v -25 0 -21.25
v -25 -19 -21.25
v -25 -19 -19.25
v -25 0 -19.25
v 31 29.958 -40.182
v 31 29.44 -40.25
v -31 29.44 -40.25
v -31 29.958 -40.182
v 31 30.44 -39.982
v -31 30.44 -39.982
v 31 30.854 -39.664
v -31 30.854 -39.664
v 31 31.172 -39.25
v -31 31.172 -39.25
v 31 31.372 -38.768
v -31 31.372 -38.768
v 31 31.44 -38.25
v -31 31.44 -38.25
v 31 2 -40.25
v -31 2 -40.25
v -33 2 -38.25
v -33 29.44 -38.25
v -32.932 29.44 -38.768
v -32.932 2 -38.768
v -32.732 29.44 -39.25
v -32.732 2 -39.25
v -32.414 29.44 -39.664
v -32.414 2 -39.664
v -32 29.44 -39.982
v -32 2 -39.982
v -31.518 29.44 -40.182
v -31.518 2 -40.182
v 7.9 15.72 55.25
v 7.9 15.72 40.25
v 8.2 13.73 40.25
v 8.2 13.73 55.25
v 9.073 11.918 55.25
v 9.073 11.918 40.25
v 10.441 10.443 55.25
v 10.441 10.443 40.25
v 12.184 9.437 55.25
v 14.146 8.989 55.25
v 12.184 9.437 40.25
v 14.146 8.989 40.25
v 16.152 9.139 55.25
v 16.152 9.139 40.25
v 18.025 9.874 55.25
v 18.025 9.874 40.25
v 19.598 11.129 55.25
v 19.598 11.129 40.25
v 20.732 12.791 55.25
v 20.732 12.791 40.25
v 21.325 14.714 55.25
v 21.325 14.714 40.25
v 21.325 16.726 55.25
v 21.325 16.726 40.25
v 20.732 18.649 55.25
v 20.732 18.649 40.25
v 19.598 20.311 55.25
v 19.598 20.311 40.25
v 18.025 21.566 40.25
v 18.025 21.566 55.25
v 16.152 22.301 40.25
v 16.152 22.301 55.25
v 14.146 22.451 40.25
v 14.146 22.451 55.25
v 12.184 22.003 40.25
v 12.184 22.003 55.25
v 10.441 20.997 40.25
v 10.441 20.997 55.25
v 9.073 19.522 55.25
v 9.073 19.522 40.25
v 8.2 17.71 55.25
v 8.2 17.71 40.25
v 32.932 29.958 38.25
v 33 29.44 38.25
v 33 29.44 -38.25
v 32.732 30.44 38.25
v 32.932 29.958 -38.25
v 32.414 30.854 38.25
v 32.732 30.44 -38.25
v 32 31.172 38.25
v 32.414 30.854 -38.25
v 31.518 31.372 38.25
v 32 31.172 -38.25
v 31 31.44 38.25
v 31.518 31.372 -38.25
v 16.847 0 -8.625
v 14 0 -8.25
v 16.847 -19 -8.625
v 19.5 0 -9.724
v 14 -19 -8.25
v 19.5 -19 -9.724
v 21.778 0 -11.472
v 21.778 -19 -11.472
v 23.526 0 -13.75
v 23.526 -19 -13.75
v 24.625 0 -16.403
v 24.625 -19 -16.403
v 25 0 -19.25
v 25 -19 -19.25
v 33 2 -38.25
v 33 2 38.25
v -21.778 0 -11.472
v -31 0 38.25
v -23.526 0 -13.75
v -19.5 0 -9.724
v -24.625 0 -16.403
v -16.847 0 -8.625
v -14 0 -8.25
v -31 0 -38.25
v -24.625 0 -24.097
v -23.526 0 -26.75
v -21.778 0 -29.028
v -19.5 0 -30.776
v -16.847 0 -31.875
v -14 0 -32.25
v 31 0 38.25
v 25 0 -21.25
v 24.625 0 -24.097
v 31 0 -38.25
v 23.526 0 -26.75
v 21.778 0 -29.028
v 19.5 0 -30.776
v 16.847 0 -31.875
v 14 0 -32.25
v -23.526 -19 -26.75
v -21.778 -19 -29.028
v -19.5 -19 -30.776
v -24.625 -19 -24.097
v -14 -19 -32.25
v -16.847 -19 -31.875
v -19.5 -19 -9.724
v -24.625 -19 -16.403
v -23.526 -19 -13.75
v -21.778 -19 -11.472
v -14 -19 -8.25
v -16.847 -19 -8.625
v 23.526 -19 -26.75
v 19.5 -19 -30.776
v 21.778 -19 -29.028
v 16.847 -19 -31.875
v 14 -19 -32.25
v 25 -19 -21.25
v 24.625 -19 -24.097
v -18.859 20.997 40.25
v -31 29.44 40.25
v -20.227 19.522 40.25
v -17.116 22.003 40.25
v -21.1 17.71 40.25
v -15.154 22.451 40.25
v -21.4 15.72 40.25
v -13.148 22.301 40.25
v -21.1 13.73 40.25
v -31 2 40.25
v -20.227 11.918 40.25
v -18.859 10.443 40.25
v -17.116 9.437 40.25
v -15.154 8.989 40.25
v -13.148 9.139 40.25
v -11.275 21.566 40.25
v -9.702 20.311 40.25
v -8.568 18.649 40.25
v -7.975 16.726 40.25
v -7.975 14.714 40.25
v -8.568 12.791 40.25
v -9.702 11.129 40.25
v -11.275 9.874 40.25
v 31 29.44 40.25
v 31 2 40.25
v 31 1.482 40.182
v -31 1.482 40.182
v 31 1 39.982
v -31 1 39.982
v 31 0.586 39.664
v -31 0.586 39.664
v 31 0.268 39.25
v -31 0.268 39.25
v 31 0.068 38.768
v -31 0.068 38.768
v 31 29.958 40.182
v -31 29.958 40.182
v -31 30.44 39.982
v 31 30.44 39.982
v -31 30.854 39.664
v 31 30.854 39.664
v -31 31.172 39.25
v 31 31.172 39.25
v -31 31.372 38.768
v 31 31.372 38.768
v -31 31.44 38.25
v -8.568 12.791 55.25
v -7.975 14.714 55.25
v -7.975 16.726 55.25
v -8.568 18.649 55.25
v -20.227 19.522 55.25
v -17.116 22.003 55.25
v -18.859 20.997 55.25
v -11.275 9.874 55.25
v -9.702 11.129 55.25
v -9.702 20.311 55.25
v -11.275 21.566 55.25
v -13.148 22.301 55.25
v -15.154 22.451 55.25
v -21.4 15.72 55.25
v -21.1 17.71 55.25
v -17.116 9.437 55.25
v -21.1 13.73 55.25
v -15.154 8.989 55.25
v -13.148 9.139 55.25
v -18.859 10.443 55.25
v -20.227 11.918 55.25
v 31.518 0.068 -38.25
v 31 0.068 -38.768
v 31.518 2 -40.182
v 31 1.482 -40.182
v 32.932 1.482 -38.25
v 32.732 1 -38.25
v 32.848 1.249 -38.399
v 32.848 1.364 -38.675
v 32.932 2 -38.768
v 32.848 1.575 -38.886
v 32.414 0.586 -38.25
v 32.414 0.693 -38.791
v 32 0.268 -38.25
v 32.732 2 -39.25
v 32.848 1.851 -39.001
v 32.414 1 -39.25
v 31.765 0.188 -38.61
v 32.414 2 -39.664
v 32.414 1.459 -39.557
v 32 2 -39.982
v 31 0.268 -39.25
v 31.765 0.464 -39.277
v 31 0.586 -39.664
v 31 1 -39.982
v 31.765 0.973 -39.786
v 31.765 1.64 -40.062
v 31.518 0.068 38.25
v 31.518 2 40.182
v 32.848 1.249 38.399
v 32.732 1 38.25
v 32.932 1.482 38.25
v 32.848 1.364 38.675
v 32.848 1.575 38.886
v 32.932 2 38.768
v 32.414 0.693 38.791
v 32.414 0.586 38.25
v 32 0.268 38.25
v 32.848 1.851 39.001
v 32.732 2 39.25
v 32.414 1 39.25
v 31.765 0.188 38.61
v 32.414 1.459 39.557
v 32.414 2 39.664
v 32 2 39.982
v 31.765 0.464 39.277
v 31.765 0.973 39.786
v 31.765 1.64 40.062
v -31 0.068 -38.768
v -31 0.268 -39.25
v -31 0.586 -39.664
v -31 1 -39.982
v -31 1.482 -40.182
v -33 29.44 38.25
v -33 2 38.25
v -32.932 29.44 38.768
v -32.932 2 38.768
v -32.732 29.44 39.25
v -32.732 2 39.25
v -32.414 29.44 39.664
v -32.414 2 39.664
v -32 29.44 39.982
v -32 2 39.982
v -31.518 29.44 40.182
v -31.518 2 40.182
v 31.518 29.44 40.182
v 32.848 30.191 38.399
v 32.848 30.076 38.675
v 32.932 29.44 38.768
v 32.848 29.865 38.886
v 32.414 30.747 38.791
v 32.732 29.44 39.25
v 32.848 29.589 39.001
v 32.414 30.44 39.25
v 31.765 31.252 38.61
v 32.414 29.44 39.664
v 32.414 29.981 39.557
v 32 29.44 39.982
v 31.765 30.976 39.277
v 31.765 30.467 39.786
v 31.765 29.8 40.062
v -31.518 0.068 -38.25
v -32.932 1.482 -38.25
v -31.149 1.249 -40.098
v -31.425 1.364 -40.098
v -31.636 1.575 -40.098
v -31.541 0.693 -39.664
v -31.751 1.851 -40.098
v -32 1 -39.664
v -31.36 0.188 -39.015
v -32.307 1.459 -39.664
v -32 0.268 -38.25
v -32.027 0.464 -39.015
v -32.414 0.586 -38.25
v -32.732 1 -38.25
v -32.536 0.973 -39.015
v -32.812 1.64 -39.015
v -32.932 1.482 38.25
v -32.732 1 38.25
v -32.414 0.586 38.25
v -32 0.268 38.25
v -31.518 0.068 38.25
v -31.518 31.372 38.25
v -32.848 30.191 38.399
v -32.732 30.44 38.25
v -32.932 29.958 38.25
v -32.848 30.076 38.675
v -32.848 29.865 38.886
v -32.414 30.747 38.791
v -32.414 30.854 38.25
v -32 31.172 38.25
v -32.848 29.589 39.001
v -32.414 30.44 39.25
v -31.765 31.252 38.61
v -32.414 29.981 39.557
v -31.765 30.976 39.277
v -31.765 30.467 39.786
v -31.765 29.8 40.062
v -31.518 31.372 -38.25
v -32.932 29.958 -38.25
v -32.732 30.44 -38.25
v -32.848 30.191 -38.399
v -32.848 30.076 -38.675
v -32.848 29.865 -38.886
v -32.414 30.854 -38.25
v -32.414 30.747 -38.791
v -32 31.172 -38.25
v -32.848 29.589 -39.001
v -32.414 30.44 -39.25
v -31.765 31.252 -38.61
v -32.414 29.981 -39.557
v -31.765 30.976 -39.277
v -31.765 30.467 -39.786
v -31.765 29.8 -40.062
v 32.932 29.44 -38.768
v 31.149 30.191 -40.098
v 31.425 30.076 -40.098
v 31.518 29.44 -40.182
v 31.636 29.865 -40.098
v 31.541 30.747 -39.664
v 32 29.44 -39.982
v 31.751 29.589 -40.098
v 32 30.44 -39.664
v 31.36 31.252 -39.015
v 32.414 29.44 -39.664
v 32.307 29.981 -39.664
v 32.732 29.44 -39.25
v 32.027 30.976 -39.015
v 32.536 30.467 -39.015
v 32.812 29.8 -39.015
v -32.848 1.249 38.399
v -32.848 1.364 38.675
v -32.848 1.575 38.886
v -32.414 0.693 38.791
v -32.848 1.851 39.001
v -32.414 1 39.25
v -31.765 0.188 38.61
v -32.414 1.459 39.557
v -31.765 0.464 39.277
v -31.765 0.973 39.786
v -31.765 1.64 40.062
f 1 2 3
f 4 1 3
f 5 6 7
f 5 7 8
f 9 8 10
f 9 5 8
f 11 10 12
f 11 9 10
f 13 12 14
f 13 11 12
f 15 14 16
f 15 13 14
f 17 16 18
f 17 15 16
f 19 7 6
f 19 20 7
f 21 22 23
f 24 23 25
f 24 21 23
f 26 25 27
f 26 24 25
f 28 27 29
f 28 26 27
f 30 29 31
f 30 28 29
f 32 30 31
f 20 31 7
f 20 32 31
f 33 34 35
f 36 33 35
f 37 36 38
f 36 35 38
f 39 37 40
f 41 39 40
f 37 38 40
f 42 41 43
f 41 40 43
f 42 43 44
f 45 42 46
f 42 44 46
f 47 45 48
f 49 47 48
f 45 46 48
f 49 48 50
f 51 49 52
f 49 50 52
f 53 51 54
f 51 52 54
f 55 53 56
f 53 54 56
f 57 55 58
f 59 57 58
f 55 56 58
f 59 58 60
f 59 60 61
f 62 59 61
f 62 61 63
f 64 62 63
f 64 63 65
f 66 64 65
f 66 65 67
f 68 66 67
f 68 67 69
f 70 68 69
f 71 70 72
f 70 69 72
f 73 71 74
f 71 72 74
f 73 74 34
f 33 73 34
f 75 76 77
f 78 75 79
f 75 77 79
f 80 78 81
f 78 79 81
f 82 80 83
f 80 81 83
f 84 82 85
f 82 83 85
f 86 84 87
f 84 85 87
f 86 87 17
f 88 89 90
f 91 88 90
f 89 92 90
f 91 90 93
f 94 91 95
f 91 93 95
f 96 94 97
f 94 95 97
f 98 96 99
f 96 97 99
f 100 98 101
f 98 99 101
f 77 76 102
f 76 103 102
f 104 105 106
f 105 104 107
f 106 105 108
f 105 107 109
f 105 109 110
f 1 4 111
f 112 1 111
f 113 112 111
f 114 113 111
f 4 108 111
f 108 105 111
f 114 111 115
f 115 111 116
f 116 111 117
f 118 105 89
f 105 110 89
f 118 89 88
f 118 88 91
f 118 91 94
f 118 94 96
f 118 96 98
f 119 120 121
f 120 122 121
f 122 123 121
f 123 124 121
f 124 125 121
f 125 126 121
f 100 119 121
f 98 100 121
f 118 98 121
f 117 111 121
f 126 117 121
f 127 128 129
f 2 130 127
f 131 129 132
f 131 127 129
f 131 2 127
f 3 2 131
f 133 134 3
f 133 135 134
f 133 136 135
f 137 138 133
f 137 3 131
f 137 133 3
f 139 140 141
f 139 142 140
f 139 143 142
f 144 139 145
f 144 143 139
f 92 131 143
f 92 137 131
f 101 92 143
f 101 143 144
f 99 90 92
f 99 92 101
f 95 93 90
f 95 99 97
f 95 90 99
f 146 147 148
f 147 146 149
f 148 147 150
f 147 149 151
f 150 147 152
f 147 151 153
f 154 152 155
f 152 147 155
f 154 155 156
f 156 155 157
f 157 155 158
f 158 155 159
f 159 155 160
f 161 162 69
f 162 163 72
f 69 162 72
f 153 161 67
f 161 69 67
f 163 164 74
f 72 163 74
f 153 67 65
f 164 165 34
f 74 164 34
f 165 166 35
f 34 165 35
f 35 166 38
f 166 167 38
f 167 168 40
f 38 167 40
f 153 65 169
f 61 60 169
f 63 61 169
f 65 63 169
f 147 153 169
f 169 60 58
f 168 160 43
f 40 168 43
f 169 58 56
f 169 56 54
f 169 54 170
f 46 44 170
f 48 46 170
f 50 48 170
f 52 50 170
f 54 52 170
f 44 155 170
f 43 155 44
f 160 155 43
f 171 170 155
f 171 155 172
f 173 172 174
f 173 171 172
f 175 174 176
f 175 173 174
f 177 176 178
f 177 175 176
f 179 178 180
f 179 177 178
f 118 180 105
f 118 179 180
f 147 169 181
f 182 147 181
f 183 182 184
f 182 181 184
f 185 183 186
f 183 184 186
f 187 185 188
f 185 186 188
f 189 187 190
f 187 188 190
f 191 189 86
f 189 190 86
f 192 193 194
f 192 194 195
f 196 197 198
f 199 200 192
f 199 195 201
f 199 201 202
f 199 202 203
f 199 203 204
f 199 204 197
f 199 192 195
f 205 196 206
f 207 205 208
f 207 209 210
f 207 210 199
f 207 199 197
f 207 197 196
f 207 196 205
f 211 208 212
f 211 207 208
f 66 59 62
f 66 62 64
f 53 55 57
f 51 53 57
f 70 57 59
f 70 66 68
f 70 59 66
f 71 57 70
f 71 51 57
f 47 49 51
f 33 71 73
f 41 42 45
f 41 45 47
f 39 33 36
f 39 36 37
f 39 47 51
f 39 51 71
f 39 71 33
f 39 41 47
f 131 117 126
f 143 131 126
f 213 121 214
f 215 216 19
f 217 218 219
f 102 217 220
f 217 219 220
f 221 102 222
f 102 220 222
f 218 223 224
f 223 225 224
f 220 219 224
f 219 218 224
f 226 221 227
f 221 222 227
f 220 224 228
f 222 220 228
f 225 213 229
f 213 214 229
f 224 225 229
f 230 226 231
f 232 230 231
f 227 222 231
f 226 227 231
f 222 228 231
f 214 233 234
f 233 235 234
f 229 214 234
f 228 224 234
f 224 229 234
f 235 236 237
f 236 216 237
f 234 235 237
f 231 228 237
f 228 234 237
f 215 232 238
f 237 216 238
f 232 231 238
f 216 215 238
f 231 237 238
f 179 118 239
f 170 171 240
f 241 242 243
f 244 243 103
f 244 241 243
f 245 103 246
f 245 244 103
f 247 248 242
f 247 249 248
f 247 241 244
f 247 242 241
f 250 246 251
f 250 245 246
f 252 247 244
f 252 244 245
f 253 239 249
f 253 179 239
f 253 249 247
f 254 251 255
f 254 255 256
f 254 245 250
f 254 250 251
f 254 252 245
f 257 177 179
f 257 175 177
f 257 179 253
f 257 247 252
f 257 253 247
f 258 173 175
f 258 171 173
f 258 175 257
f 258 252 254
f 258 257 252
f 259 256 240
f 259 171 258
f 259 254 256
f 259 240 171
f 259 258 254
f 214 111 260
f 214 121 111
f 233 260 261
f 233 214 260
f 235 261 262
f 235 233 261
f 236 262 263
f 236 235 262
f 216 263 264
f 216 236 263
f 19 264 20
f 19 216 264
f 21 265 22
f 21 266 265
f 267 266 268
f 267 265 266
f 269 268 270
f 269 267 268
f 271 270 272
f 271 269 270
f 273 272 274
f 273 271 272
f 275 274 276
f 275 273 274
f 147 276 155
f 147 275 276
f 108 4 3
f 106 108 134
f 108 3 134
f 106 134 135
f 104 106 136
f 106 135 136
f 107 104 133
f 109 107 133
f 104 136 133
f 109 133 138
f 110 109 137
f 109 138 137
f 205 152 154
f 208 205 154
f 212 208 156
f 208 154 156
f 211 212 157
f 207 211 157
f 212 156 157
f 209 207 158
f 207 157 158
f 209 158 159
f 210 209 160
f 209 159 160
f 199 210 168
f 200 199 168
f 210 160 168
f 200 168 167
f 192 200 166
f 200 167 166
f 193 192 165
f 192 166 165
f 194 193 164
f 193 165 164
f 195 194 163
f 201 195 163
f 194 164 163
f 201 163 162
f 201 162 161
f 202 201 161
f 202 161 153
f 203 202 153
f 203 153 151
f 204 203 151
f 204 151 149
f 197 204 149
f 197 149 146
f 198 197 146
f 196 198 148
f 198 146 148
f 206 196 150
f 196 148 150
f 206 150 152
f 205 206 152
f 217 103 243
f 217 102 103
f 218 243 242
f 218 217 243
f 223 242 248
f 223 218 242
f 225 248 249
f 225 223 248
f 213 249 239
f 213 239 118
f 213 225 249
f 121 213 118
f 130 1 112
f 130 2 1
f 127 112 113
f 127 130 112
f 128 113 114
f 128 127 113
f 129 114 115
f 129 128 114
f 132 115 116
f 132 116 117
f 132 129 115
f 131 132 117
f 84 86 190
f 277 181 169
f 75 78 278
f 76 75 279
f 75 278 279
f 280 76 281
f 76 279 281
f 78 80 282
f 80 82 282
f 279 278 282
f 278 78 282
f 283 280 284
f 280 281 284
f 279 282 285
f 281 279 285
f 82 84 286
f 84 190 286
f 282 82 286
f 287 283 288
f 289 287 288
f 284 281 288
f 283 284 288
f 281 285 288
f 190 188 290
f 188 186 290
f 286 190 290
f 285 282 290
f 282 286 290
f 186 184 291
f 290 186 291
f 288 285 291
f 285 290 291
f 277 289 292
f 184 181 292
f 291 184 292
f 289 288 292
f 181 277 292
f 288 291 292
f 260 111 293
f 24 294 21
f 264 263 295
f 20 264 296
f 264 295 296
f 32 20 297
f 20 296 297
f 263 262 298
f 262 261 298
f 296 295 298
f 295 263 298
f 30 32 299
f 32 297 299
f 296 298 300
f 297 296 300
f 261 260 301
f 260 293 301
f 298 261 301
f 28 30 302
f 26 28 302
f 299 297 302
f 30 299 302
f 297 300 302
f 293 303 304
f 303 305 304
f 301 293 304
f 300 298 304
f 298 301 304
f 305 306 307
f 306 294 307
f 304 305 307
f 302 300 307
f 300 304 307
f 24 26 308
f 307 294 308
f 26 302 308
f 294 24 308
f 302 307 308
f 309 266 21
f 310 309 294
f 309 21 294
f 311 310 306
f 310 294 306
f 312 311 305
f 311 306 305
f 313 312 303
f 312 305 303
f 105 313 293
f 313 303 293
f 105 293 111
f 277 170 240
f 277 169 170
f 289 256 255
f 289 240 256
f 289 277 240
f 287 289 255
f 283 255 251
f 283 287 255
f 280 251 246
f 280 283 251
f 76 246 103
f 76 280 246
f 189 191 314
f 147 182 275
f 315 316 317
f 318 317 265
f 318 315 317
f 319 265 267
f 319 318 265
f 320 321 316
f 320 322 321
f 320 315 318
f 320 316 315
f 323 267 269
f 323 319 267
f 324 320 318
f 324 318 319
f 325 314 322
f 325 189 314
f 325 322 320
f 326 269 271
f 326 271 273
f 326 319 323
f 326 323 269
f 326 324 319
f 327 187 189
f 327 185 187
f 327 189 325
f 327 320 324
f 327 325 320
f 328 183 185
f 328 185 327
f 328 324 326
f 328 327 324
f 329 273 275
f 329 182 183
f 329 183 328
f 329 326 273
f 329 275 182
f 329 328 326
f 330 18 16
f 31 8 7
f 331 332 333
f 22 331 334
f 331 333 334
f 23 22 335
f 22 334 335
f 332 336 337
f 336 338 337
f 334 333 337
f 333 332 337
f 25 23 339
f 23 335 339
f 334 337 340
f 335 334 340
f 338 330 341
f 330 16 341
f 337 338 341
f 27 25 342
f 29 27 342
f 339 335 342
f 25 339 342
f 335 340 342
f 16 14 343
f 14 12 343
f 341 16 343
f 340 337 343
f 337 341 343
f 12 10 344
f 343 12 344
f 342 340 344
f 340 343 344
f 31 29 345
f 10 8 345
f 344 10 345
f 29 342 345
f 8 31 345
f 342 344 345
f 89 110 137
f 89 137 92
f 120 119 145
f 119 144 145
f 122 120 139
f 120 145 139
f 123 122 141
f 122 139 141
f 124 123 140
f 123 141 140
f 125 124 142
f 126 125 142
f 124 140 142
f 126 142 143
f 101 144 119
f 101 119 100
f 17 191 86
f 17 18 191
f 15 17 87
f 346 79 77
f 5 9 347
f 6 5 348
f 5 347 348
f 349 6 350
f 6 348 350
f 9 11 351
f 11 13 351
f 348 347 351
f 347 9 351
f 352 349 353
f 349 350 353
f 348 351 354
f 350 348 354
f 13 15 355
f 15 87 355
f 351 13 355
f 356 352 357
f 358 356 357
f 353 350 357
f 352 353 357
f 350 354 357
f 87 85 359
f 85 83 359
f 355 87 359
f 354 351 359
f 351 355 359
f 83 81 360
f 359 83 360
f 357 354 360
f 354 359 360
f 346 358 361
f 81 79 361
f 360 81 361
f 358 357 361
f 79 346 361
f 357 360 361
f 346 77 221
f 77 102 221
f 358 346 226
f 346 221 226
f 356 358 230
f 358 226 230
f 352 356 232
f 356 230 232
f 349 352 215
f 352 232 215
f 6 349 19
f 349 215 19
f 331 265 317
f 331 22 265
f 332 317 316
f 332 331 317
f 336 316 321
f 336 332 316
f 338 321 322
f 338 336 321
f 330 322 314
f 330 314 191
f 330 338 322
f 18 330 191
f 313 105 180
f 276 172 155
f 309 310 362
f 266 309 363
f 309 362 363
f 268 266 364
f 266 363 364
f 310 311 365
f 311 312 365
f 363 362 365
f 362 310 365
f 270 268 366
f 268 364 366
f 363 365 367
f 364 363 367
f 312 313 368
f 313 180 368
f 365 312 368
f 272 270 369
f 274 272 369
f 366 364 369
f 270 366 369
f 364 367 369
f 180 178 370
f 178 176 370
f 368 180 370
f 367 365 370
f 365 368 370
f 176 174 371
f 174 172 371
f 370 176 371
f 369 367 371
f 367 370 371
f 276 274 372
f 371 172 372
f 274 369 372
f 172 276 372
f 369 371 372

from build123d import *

# Parameters (mm, degrees)
SKETCH1_W           = 66
SKETCH1_H           = 80.5
BOSS_EXTRUDE1_DEPTH = 24.14
SKETCH2_W           = 50
SKETCH2_H           = 24
BOSS_EXTRUDE2_DEPTH = 19
SKETCH3_W           = 66
SKETCH3_H           = 80.5
BOSS_EXTRUDE3_DEPTH = 7.3
FILLET1_R           = 2
FILLET2_R           = 11
SKETCH4_R           = 6.75
BOSS_EXTRUDE4_DEPTH = 15


with BuildPart() as part:
    # Sketch1 → Boss-Extrude1 (new body)
    with BuildSketch(Plane(origin=(0, 0, 0), x_dir=(1, 0, 0), z_dir=(0, 1, 0))):
        Rectangle(SKETCH1_W, SKETCH1_H)
    extrude(amount=BOSS_EXTRUDE1_DEPTH)

    # Sketch2 → Boss-Extrude2 (add)
    with BuildSketch(Plane.XZ):
        with Locations((0, -20.25)):
            Rectangle(SKETCH2_W, SKETCH2_H)
    extrude(amount=BOSS_EXTRUDE2_DEPTH)

    # Sketch3 → Boss-Extrude3 (add)
    with BuildSketch(Plane(origin=(0, 24.14, 0), x_dir=(1, 0, 0), z_dir=(0, 1, 0))):
        Rectangle(SKETCH3_W, SKETCH3_H)
    extrude(amount=BOSS_EXTRUDE3_DEPTH)

    # Fillet1
    fillet1_edges = [part.edges().sort_by_distance(p)[0] for p in [
        (0, 31.44, 40.25),
        (33, 31.44, 0),
        (0, 31.44, -40.25),
        (-33, 31.44, 0),
        (0, 0, 40.25),
        (-33, 0, 0),
        (0, 0, -40.25),
        (33, 0, 0),
        (33, 15.72, 40.25),
        (-33, 15.72, 40.25),
        (-33, 15.72, -40.25),
        (33, 15.72, -40.25),
    ]]
    fillet(fillet1_edges, radius=FILLET1_R)

    # Fillet2
    fillet2_edges = [part.edges().sort_by_distance(p)[0] for p in [
        (-25, -9.5, -8.25),
        (-25, -9.5, -32.25),
        (25, -9.5, -32.25),
        (25, -9.5, -8.25),
    ]]
    fillet(fillet2_edges, radius=FILLET2_R)

    # Sketch4 → Boss-Extrude4 (add)
    with BuildSketch(Plane.XY.offset(40.25)):
        with Locations(Location((-14.64999991, 15.7200005, 0), (0, 0, 180))):
            Circle(SKETCH4_R)
        with Locations(Location((14.64999991, 15.7200005, 0), (0, 0, 180))):
            Circle(SKETCH4_R)
    extrude(amount=BOSS_EXTRUDE4_DEPTH)


solid = part.part
